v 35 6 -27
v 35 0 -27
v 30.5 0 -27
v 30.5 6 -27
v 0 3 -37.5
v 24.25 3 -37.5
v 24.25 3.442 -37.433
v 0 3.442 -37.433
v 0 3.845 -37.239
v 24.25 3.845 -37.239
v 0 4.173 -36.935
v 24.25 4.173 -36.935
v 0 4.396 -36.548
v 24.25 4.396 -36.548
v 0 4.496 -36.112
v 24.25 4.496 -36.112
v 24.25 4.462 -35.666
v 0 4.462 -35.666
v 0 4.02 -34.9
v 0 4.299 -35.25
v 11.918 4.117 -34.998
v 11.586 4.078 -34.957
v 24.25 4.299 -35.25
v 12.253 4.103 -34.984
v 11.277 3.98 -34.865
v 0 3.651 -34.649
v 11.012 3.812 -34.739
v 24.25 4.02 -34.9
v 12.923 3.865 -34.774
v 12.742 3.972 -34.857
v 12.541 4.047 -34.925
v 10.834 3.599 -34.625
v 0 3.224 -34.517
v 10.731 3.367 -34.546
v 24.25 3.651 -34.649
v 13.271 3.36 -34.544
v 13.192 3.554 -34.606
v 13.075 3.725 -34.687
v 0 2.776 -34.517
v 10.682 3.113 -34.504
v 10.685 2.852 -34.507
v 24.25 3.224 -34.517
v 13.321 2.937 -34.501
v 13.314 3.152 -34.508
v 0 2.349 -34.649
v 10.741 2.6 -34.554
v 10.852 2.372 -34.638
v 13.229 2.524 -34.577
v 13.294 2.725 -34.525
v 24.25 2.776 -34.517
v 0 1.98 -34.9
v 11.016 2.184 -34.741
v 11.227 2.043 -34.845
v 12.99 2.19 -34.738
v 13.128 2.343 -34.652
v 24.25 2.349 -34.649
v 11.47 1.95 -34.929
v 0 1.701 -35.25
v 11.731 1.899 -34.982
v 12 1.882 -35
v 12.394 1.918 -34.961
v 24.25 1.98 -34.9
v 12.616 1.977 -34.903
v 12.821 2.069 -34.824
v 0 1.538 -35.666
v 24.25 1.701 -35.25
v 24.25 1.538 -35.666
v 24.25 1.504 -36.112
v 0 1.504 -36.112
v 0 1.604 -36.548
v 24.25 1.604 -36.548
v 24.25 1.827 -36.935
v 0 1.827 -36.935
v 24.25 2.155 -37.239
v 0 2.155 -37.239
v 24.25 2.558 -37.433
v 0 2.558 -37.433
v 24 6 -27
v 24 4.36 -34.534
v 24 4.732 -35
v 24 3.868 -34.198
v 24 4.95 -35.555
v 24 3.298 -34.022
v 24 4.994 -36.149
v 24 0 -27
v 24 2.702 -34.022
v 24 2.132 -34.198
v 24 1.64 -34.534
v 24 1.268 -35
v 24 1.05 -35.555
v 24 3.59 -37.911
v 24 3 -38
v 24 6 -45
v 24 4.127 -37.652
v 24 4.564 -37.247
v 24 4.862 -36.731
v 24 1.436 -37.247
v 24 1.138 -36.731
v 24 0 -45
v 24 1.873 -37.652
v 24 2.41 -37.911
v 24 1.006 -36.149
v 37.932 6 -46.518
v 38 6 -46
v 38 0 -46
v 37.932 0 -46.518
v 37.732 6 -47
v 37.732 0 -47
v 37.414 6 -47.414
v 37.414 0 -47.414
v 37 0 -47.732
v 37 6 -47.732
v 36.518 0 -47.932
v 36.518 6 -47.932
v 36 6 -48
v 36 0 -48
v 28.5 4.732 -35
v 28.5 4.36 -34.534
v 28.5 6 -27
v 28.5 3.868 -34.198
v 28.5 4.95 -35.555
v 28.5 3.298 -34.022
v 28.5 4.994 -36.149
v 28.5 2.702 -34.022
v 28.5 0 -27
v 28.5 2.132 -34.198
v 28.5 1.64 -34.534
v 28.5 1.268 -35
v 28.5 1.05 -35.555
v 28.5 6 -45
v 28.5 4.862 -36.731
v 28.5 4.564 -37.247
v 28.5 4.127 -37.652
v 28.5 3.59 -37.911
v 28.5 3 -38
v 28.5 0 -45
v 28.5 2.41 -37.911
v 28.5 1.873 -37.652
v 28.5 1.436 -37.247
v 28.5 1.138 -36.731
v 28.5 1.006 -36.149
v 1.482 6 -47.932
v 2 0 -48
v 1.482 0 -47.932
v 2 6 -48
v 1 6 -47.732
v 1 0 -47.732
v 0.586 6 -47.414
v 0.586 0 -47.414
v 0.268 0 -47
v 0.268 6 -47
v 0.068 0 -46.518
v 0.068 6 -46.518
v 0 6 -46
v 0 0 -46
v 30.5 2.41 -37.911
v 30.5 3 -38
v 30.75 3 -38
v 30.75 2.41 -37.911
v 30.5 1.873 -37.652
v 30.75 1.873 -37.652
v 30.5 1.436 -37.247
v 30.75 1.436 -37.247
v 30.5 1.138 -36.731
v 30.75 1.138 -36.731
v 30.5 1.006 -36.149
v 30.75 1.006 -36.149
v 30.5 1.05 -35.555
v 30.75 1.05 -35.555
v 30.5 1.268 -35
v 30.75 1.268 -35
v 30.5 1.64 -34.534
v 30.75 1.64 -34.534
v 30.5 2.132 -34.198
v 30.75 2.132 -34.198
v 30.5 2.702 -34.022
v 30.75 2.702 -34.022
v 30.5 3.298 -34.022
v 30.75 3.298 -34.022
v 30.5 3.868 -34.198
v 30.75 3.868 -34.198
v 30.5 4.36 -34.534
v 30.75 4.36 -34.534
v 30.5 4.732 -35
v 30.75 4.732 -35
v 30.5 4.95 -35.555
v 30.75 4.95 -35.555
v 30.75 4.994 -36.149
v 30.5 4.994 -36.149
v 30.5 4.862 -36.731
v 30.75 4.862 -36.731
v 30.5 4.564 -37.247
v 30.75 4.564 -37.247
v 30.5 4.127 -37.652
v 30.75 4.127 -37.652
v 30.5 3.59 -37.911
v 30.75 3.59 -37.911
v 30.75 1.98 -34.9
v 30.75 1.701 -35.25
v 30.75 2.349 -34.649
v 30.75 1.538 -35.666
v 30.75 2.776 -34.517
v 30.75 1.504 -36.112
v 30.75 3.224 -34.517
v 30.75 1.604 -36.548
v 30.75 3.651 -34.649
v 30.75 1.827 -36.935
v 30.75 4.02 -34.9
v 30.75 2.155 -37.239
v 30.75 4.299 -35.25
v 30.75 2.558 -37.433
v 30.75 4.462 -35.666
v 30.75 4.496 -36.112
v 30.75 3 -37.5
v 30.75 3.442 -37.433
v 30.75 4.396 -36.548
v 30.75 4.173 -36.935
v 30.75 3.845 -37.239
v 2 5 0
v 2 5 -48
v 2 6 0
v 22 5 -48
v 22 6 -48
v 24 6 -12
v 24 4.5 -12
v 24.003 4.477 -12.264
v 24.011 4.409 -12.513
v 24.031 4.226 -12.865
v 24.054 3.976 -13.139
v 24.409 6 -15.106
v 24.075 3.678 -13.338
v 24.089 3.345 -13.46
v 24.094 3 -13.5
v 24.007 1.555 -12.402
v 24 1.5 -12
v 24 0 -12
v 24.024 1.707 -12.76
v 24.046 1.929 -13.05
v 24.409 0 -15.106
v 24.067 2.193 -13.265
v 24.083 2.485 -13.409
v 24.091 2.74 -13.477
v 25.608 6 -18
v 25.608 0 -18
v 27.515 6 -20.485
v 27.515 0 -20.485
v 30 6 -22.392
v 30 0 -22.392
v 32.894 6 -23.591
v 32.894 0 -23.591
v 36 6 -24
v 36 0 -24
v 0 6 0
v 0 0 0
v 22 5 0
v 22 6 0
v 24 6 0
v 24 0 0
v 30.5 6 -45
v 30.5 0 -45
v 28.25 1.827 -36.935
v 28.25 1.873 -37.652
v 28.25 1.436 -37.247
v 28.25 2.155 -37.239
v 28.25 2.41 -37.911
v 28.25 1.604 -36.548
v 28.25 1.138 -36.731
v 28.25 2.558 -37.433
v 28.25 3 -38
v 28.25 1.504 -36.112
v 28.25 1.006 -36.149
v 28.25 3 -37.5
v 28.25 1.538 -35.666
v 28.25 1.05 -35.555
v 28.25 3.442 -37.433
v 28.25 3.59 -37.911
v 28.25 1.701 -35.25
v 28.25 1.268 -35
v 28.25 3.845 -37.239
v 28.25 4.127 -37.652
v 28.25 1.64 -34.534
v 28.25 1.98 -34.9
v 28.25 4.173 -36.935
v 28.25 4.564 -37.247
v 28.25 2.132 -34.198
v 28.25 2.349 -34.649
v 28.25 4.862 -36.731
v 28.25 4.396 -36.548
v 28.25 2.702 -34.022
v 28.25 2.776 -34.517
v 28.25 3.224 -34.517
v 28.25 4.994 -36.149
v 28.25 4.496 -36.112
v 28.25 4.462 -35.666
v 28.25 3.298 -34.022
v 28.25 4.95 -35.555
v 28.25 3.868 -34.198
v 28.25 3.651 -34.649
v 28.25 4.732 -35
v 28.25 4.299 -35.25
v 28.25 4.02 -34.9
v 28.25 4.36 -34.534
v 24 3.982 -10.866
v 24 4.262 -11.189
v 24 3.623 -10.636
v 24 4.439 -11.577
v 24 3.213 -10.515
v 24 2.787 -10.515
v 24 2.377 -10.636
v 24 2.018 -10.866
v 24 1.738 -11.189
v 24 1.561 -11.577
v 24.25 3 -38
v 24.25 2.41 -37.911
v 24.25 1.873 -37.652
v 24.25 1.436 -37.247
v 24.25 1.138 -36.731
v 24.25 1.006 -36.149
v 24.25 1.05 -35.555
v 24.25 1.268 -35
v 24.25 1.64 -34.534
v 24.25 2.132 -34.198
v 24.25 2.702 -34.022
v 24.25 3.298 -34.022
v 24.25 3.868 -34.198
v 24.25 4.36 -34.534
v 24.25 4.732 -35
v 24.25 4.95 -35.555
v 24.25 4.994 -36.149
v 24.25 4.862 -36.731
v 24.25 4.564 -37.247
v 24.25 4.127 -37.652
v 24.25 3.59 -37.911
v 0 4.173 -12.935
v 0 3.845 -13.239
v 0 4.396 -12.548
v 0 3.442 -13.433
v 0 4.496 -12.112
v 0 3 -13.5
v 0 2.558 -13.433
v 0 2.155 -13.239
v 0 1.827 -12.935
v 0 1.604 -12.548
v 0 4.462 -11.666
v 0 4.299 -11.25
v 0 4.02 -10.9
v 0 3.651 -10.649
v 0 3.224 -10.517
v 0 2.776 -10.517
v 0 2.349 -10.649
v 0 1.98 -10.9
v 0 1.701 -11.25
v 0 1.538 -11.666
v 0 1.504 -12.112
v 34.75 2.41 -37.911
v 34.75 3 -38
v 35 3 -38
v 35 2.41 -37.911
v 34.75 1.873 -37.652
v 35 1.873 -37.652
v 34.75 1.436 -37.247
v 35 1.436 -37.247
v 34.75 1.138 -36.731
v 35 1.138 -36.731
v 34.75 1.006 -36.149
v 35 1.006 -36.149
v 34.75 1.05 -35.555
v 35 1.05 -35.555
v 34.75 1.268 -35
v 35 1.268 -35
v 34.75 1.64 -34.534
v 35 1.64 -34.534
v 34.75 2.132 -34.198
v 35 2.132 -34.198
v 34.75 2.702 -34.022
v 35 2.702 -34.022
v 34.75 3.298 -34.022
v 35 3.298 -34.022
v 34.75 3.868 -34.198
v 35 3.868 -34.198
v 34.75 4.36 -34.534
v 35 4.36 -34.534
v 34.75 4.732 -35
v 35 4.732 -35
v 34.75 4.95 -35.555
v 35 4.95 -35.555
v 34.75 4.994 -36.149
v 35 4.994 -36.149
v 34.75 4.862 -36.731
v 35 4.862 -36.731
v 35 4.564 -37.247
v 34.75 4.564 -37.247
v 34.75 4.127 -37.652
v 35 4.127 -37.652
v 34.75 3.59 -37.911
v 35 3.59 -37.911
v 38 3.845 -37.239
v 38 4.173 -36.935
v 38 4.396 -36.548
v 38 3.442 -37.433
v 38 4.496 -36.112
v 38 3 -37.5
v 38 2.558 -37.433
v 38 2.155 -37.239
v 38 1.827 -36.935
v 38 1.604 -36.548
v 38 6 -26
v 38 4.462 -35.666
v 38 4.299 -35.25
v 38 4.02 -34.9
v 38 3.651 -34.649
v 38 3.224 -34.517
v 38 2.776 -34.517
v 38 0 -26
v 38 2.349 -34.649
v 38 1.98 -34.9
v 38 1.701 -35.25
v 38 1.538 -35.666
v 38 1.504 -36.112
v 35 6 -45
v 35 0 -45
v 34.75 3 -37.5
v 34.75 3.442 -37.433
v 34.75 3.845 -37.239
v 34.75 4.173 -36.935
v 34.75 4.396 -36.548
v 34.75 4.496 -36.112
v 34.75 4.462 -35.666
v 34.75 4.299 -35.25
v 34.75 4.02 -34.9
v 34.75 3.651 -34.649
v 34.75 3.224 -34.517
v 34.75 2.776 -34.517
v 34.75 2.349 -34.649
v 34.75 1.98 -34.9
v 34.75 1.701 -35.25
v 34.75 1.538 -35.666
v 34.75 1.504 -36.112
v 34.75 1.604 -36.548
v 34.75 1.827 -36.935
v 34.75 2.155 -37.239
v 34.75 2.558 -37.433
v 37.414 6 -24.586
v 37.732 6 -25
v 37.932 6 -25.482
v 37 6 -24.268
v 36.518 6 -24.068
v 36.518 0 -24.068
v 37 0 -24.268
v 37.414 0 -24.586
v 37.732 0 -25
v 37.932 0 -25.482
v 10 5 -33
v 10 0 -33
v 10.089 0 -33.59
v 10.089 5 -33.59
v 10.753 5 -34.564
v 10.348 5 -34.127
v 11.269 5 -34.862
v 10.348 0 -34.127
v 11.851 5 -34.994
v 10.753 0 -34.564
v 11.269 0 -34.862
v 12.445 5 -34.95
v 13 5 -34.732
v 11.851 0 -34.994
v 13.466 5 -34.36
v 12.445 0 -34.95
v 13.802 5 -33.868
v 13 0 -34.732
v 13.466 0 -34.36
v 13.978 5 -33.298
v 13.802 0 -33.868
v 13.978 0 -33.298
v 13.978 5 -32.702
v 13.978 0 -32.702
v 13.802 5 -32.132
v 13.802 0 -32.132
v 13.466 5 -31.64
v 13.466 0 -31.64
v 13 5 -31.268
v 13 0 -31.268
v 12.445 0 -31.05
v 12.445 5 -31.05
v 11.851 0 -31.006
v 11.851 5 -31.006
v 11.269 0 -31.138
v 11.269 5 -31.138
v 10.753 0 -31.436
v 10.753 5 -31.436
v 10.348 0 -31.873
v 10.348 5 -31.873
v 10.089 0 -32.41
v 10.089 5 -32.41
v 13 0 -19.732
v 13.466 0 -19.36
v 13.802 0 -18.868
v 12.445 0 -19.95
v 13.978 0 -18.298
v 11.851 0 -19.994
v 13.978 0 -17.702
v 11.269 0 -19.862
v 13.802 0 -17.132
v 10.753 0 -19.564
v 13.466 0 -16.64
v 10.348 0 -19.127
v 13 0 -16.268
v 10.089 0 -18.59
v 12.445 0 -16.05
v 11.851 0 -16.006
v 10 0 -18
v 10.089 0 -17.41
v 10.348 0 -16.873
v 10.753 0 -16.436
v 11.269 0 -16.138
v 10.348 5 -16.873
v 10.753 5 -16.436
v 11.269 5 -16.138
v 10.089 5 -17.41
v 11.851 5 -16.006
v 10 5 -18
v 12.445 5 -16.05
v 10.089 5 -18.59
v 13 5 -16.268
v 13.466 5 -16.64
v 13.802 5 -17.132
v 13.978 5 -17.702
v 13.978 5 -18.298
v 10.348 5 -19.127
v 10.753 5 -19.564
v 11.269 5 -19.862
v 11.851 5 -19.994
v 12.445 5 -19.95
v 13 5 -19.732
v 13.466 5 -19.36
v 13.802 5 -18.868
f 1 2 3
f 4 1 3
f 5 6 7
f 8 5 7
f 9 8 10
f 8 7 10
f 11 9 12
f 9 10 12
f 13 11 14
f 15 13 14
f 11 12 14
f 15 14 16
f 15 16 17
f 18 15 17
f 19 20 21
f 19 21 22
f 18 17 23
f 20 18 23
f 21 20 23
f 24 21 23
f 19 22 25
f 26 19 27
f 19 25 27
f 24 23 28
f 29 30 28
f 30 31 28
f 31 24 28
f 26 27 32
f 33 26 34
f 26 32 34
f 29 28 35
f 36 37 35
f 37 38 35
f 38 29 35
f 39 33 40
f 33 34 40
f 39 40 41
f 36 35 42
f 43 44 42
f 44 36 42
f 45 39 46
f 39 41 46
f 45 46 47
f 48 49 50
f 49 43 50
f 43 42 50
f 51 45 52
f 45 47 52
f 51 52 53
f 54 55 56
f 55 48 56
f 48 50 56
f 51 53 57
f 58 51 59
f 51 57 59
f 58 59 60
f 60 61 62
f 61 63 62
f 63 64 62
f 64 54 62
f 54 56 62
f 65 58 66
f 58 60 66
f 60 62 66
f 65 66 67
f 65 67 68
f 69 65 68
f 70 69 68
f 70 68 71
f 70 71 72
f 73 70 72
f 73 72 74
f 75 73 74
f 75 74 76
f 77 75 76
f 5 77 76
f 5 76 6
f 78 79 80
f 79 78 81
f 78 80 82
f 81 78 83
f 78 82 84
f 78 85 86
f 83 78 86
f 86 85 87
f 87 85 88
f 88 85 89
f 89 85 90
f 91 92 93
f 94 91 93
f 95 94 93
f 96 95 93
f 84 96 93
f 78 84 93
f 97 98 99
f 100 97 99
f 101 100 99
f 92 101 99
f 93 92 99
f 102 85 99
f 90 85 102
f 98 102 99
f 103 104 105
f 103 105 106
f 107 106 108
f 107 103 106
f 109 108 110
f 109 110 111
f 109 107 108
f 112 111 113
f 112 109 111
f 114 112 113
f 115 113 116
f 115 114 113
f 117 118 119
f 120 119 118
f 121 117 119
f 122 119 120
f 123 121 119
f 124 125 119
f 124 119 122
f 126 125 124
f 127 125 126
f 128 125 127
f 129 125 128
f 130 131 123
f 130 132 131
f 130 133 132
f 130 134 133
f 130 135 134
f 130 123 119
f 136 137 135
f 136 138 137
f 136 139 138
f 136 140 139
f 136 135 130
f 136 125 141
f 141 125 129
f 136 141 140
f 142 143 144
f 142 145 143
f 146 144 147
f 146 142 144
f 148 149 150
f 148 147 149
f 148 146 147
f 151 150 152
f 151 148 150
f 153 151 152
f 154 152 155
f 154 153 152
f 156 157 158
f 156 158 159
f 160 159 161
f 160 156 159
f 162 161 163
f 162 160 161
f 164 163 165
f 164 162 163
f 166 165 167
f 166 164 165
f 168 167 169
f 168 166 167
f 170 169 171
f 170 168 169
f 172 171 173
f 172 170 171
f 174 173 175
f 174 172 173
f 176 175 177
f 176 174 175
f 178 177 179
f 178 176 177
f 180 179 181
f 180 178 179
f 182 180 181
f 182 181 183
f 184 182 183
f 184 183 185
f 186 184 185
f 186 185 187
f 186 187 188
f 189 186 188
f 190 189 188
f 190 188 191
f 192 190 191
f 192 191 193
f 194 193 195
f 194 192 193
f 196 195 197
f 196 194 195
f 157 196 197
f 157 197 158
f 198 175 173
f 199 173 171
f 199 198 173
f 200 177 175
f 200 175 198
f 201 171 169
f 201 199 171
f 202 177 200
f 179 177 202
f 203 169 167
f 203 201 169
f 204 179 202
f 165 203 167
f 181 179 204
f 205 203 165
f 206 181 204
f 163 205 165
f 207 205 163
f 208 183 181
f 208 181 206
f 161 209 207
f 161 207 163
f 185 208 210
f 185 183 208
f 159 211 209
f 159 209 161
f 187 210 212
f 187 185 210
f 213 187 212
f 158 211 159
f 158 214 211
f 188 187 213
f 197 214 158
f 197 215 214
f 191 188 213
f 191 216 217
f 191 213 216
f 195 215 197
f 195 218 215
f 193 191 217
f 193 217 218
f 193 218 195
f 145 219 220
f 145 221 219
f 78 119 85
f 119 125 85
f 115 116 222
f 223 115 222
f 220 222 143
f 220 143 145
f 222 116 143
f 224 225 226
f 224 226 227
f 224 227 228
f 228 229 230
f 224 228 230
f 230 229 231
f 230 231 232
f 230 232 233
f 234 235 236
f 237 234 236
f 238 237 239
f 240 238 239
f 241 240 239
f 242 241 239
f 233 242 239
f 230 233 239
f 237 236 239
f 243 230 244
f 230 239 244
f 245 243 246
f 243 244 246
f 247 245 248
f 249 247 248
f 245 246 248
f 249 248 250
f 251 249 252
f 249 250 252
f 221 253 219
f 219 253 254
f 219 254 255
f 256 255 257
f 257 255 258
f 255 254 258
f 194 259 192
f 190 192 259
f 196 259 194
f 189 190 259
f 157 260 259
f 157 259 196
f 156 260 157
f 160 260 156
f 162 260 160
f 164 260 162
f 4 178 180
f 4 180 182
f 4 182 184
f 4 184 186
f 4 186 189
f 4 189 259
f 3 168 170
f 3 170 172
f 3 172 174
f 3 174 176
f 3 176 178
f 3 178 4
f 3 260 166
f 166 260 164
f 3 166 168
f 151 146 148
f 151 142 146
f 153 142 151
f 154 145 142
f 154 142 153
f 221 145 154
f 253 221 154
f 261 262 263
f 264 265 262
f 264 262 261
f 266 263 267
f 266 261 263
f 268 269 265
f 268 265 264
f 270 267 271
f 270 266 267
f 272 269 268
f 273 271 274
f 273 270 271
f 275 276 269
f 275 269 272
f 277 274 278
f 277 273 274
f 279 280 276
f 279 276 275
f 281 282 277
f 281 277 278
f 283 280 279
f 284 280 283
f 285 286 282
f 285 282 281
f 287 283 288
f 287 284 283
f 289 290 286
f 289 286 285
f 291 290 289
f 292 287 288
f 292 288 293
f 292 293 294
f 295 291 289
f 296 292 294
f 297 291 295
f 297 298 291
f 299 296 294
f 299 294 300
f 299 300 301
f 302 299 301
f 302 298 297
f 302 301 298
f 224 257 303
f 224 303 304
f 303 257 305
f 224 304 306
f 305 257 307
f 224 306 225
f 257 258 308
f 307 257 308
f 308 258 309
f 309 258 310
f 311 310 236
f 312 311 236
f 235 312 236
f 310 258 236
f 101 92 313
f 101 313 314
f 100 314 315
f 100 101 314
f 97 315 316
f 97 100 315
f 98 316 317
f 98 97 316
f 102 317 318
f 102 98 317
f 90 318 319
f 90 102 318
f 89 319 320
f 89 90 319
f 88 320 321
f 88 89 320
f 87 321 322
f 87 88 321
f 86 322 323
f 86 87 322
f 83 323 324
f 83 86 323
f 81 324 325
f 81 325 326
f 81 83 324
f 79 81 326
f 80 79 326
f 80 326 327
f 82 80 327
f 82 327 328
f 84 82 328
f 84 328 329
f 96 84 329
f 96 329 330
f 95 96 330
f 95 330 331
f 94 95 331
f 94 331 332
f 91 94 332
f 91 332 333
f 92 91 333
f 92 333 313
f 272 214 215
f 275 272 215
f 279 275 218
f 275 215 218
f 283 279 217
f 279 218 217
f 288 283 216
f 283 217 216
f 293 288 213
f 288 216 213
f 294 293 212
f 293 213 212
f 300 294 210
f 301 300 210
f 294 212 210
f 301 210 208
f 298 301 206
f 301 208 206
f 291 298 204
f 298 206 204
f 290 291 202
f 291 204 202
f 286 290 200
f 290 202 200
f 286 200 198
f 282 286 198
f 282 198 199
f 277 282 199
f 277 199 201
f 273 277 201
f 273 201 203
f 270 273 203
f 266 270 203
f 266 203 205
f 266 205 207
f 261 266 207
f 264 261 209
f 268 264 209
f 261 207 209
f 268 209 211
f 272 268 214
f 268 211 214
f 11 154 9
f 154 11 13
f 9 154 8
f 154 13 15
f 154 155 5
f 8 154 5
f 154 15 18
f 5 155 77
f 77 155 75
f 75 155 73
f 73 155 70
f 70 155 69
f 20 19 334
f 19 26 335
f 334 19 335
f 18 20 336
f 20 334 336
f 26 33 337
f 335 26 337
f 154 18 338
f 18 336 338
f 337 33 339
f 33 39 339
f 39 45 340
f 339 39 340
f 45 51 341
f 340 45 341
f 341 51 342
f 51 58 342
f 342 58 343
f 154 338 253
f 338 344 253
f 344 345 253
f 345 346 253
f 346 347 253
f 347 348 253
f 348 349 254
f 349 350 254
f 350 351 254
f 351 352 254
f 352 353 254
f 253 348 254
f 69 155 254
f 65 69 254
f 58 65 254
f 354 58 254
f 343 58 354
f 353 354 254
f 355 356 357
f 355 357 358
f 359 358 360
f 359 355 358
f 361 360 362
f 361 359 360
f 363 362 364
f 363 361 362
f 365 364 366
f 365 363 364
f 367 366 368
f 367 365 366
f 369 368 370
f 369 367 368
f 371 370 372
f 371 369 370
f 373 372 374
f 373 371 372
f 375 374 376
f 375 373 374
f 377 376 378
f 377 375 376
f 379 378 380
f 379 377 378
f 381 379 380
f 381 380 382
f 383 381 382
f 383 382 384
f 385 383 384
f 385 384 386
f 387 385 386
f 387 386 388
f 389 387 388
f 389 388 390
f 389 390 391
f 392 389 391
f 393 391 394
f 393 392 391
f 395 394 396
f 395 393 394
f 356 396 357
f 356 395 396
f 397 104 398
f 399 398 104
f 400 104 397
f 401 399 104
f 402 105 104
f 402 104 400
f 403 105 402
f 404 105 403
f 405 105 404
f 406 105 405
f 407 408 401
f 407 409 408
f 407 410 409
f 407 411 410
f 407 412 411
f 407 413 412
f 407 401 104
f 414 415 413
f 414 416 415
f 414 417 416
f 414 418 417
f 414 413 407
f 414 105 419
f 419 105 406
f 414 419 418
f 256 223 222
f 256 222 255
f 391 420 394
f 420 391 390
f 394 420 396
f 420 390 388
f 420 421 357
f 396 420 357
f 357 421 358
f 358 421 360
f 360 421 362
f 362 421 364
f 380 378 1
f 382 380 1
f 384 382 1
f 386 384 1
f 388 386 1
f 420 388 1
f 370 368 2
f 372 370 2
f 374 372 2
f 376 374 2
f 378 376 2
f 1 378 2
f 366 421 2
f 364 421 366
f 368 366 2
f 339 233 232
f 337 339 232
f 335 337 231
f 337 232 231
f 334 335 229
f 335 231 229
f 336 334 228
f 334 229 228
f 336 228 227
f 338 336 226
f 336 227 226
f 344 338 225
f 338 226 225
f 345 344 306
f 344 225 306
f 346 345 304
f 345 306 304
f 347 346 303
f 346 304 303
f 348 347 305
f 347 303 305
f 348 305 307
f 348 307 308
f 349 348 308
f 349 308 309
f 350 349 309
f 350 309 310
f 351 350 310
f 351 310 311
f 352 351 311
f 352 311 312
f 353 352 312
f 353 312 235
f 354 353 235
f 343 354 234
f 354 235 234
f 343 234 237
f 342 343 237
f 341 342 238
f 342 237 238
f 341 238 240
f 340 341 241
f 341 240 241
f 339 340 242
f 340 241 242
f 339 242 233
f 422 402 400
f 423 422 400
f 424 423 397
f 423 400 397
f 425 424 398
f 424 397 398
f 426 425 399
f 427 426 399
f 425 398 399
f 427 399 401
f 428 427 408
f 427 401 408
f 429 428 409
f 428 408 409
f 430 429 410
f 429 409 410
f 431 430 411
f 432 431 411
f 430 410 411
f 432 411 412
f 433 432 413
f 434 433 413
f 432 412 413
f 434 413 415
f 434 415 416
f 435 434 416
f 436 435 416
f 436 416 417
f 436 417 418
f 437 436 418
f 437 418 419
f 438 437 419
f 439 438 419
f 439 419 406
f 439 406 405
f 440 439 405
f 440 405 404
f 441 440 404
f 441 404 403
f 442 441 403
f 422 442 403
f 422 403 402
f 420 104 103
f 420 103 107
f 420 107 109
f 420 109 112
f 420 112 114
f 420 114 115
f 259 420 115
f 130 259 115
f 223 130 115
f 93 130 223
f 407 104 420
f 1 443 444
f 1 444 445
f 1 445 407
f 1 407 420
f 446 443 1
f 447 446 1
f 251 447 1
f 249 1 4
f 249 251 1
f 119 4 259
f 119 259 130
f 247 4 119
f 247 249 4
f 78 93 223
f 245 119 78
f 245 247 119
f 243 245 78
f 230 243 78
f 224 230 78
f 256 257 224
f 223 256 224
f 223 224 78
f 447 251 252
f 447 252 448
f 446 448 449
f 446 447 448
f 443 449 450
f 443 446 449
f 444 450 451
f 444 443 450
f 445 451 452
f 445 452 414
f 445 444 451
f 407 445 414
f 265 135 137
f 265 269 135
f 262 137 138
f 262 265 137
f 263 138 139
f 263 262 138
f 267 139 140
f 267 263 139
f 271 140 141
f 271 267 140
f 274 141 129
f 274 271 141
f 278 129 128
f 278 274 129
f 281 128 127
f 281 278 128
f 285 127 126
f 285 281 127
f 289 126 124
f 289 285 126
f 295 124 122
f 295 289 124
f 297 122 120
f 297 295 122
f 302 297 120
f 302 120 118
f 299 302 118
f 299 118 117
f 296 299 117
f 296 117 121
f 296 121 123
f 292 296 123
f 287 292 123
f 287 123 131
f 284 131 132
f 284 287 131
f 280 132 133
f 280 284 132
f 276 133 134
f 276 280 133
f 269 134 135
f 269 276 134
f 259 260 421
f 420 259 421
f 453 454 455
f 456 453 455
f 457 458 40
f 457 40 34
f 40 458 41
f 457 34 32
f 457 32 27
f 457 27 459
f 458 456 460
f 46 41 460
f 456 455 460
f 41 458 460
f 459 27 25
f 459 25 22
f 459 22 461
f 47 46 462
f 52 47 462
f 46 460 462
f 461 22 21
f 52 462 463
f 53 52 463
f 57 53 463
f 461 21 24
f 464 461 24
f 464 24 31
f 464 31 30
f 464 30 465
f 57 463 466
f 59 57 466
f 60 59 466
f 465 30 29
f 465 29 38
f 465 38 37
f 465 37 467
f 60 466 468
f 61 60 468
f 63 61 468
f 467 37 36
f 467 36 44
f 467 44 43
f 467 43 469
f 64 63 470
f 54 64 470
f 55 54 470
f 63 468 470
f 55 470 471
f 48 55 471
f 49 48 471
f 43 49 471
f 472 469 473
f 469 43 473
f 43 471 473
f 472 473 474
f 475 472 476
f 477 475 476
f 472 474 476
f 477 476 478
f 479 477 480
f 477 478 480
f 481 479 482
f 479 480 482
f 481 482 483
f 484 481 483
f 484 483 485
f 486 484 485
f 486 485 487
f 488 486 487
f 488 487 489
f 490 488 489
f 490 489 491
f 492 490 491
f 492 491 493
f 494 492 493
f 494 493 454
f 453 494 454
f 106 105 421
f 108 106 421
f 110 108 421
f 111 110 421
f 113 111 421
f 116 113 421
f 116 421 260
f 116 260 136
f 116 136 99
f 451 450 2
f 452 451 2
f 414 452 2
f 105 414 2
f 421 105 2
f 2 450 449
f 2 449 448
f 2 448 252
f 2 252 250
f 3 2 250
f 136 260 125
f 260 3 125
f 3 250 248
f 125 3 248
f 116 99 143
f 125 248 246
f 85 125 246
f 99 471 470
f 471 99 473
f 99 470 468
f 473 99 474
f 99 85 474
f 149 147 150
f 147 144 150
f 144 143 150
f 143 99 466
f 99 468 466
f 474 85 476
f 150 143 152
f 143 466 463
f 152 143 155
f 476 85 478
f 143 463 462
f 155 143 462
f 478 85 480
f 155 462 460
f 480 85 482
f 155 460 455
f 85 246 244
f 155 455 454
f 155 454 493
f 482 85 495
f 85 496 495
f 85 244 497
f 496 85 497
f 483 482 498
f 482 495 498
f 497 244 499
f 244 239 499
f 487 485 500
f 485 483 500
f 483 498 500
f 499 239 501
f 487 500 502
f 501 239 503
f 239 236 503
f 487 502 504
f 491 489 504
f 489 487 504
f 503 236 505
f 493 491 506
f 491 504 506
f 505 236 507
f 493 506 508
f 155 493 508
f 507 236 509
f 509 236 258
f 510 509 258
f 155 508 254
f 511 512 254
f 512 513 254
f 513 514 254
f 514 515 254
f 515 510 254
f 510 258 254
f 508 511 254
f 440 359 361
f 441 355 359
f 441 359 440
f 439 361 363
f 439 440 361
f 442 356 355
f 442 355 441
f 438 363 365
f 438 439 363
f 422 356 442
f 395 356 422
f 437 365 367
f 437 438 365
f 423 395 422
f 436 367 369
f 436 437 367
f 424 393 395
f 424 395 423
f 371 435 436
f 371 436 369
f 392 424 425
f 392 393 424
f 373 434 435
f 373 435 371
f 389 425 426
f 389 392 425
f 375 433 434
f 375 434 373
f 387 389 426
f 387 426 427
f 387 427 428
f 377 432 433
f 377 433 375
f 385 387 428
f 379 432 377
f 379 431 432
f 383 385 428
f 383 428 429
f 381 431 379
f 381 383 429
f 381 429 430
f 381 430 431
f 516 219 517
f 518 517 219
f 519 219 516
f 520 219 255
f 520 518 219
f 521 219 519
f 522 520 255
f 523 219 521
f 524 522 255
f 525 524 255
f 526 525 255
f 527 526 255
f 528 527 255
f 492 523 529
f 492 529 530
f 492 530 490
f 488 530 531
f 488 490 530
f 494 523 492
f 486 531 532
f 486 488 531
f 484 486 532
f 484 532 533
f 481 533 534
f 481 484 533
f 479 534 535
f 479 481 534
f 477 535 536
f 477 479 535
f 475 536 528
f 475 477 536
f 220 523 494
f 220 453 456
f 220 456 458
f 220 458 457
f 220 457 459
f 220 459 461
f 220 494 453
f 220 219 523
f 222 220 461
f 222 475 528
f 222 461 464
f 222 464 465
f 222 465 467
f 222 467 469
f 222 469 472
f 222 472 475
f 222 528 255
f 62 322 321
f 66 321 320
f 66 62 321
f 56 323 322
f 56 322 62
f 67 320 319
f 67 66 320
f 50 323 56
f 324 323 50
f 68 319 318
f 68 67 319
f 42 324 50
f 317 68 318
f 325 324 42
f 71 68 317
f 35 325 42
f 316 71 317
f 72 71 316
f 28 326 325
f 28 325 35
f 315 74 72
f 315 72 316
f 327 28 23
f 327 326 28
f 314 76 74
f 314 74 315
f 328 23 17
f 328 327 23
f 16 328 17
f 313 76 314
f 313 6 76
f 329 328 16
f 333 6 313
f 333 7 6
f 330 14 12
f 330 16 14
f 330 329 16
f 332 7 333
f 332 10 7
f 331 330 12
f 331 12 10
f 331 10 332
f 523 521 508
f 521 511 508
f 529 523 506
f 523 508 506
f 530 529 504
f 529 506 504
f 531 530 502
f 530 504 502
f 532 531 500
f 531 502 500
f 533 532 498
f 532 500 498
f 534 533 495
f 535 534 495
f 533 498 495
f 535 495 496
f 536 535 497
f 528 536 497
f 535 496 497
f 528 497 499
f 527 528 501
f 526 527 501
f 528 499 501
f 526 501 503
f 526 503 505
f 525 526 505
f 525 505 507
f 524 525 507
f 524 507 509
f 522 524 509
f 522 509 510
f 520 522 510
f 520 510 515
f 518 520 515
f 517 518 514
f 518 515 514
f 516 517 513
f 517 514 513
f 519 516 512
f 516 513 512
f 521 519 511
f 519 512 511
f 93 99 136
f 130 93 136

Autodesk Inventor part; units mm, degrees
ref_plane "YZ Plane" through (0, 0, 0) normal (1, 0, 0) x (0, 1, 0)
ref_plane "XZ Plane" through (0, 0, 0) normal (0, 1, 0) x (-1, 0, 0)
ref_plane "XY Plane" through (0, 0, 0) normal (0, 0, 1) x (1, 0, 0)
sketch "Sketch1" plane through (0, 0, 0) normal (0, 1, 0) x (-1, 0, 0)
  line L0 (0, 0) -> (-24, 0)
  line L1 (-24, -48) -> (0, -48)
  line L2 (0, -48) -> (0, 0)
  circle A0 centre (-12, -33) radius 2
  circle A1 centre (-12, -18) radius 2
  line L3 (-24, -48) -> (-38, -48)
  line L4 (-38, -48) -> (-38, -24)
  line L5 (-38, -24) -> (-24, -24)
  line L6 (-24, -27) -> (-24, -45)
  line L7 (-24, -45) -> (-35, -45)
  line L8 (-35, -45) -> (-35, -27)
  line L9 (-35, -27) -> (-24, -27)
  line L10 (-24, -27) -> (-24, -45)
  line L11 (-24, 0) -> (-24, -24)
  line L12 (-24, -27) -> (-24, -45)
  line L13 (-28.5, -45) -> (-30.5, -45)
  line L14 (-30.5, -45) -> (-30.5, -27)
  line L15 (-30.5, -27) -> (-28.5, -27)
  line L16 (-28.5, -27) -> (-28.5, -45)
  point P0 (-12, -48)
  dimension "d0" = 24
  dimension "d1" = 48
  dimension "d2" = 4
  dimension "d3" = 4
  dimension "d4" = 15
  dimension "d5" = 30
  dimension "d6" = 14
  dimension "d7" = 24
  dimension "d8" = 3
  dimension "d9" = 3
  dimension "d10" = 3
  dimension "d11" = 48
  dimension "d12" = 11
  dimension "d27" = 18
  dimension "d28" = 4.5
  dimension "d29" = 4.5
extrude "Extrusion1" add sketch "Sketch1" along normal blind 6 contours L2 L1 L3 L4 L5 L11 L0 | L16 L7 L14 L9
sketch "Sketch2" plane through (0, 6, 0) normal (0, 1, 0) x (1, 0, 0)
  line L0 (2, 48) -> (22, 48)
  line L1 (22, 48) -> (22, 0)
  line L2 (22, 0) -> (2, 0)
  line L3 (2, 0) -> (2, 48)
  line L4 (0, 0) -> (24, 0) projected
  point P0 (12, 0)
  point P1 (12, 0)
  dimension "d15" = 20
  dimension "d16" = 48
extrude "Extrusion2" cut sketch "Sketch2" against normal blind 1
sketch "Sketch3" plane through (38, 0, -24) normal (1, 0, 0) x (0, 0, -1)
  circle A0 centre (12, 3) radius 1.5
  line L0 (24, 0) -> (24, 6) projected
  line L1 (0, 6) -> (24, 6) projected
  point P0 (-24, 0)
  point P1 (24, 3)
  point P2 (12, 6)
  dimension "d19" = 3
extrude "Extrusion3" cut sketch "Sketch3" against normal through all
sketch "Sketch4" plane through (24, 0, 0) normal (1, 0, 0) x (0, 0, -1)
  circle A0 centre (12, 3) radius 1.5
  line L0 (0, 0) -> (0, 6) projected
  point P0 (0, 3)
  dimension "d22" = 3
  dimension "d23" = 12
extrude "Extrusion4" cut sketch "Sketch4" against normal through all
sketch "Sketch5" plane through (24, 0, -27) normal (1, 0, 0) x (0, 0, -1)
  circle A0 centre (9, 3) radius 1.5
  circle A1 centre (9, 3) radius 1.5 projected
  circle A2 centre (9, 3) radius 2
  point P0 (-27, 0)
  dimension "d30" = 3
  dimension "d31" = 4
extrude "Extrusion5" add sketch "Sketch5" along normal blind 12
sketch "Sketch6" plane through (0, 6, 0) normal (0, 1, 0) x (1, 0, 0)
  line L0 (30.75, 42.7686) -> (34.75, 42.7686)
  line L1 (34.75, 42.7686) -> (34.75, 30.7686)
  line L2 (34.75, 30.7686) -> (30.75, 30.7686)
  line L3 (30.75, 30.7686) -> (30.75, 42.7686)
  line L4 (30.5, 27) -> (30.5, 45) projected
  line L5 (24.25, 42.1188) -> (28.25, 42.1188)
  line L6 (28.25, 42.1188) -> (28.25, 30.1188)
  line L7 (28.25, 30.1188) -> (24.25, 30.1188)
  line L8 (24.25, 30.1188) -> (24.25, 42.1188)
  line L9 (24, 27) -> (24, 45) projected
  point P0 (0, 0)
  dimension "d34" = 4
  dimension "d35" = 12
  dimension "d36" = 0.25
  dimension "d37" = 4
  dimension "d38" = 12
  dimension "d39" = 0.25
extrude "Extrusion6" cut sketch "Sketch6" against normal through all
fillet "Fillet1" radius 12 1 edges at (24, 3, -24)
fillet "Fillet2" radius 2 3 edges at (38, 3, -24) (38, 3, -48) (0, 3, -48)
properties part number "rightshortNEW1"
